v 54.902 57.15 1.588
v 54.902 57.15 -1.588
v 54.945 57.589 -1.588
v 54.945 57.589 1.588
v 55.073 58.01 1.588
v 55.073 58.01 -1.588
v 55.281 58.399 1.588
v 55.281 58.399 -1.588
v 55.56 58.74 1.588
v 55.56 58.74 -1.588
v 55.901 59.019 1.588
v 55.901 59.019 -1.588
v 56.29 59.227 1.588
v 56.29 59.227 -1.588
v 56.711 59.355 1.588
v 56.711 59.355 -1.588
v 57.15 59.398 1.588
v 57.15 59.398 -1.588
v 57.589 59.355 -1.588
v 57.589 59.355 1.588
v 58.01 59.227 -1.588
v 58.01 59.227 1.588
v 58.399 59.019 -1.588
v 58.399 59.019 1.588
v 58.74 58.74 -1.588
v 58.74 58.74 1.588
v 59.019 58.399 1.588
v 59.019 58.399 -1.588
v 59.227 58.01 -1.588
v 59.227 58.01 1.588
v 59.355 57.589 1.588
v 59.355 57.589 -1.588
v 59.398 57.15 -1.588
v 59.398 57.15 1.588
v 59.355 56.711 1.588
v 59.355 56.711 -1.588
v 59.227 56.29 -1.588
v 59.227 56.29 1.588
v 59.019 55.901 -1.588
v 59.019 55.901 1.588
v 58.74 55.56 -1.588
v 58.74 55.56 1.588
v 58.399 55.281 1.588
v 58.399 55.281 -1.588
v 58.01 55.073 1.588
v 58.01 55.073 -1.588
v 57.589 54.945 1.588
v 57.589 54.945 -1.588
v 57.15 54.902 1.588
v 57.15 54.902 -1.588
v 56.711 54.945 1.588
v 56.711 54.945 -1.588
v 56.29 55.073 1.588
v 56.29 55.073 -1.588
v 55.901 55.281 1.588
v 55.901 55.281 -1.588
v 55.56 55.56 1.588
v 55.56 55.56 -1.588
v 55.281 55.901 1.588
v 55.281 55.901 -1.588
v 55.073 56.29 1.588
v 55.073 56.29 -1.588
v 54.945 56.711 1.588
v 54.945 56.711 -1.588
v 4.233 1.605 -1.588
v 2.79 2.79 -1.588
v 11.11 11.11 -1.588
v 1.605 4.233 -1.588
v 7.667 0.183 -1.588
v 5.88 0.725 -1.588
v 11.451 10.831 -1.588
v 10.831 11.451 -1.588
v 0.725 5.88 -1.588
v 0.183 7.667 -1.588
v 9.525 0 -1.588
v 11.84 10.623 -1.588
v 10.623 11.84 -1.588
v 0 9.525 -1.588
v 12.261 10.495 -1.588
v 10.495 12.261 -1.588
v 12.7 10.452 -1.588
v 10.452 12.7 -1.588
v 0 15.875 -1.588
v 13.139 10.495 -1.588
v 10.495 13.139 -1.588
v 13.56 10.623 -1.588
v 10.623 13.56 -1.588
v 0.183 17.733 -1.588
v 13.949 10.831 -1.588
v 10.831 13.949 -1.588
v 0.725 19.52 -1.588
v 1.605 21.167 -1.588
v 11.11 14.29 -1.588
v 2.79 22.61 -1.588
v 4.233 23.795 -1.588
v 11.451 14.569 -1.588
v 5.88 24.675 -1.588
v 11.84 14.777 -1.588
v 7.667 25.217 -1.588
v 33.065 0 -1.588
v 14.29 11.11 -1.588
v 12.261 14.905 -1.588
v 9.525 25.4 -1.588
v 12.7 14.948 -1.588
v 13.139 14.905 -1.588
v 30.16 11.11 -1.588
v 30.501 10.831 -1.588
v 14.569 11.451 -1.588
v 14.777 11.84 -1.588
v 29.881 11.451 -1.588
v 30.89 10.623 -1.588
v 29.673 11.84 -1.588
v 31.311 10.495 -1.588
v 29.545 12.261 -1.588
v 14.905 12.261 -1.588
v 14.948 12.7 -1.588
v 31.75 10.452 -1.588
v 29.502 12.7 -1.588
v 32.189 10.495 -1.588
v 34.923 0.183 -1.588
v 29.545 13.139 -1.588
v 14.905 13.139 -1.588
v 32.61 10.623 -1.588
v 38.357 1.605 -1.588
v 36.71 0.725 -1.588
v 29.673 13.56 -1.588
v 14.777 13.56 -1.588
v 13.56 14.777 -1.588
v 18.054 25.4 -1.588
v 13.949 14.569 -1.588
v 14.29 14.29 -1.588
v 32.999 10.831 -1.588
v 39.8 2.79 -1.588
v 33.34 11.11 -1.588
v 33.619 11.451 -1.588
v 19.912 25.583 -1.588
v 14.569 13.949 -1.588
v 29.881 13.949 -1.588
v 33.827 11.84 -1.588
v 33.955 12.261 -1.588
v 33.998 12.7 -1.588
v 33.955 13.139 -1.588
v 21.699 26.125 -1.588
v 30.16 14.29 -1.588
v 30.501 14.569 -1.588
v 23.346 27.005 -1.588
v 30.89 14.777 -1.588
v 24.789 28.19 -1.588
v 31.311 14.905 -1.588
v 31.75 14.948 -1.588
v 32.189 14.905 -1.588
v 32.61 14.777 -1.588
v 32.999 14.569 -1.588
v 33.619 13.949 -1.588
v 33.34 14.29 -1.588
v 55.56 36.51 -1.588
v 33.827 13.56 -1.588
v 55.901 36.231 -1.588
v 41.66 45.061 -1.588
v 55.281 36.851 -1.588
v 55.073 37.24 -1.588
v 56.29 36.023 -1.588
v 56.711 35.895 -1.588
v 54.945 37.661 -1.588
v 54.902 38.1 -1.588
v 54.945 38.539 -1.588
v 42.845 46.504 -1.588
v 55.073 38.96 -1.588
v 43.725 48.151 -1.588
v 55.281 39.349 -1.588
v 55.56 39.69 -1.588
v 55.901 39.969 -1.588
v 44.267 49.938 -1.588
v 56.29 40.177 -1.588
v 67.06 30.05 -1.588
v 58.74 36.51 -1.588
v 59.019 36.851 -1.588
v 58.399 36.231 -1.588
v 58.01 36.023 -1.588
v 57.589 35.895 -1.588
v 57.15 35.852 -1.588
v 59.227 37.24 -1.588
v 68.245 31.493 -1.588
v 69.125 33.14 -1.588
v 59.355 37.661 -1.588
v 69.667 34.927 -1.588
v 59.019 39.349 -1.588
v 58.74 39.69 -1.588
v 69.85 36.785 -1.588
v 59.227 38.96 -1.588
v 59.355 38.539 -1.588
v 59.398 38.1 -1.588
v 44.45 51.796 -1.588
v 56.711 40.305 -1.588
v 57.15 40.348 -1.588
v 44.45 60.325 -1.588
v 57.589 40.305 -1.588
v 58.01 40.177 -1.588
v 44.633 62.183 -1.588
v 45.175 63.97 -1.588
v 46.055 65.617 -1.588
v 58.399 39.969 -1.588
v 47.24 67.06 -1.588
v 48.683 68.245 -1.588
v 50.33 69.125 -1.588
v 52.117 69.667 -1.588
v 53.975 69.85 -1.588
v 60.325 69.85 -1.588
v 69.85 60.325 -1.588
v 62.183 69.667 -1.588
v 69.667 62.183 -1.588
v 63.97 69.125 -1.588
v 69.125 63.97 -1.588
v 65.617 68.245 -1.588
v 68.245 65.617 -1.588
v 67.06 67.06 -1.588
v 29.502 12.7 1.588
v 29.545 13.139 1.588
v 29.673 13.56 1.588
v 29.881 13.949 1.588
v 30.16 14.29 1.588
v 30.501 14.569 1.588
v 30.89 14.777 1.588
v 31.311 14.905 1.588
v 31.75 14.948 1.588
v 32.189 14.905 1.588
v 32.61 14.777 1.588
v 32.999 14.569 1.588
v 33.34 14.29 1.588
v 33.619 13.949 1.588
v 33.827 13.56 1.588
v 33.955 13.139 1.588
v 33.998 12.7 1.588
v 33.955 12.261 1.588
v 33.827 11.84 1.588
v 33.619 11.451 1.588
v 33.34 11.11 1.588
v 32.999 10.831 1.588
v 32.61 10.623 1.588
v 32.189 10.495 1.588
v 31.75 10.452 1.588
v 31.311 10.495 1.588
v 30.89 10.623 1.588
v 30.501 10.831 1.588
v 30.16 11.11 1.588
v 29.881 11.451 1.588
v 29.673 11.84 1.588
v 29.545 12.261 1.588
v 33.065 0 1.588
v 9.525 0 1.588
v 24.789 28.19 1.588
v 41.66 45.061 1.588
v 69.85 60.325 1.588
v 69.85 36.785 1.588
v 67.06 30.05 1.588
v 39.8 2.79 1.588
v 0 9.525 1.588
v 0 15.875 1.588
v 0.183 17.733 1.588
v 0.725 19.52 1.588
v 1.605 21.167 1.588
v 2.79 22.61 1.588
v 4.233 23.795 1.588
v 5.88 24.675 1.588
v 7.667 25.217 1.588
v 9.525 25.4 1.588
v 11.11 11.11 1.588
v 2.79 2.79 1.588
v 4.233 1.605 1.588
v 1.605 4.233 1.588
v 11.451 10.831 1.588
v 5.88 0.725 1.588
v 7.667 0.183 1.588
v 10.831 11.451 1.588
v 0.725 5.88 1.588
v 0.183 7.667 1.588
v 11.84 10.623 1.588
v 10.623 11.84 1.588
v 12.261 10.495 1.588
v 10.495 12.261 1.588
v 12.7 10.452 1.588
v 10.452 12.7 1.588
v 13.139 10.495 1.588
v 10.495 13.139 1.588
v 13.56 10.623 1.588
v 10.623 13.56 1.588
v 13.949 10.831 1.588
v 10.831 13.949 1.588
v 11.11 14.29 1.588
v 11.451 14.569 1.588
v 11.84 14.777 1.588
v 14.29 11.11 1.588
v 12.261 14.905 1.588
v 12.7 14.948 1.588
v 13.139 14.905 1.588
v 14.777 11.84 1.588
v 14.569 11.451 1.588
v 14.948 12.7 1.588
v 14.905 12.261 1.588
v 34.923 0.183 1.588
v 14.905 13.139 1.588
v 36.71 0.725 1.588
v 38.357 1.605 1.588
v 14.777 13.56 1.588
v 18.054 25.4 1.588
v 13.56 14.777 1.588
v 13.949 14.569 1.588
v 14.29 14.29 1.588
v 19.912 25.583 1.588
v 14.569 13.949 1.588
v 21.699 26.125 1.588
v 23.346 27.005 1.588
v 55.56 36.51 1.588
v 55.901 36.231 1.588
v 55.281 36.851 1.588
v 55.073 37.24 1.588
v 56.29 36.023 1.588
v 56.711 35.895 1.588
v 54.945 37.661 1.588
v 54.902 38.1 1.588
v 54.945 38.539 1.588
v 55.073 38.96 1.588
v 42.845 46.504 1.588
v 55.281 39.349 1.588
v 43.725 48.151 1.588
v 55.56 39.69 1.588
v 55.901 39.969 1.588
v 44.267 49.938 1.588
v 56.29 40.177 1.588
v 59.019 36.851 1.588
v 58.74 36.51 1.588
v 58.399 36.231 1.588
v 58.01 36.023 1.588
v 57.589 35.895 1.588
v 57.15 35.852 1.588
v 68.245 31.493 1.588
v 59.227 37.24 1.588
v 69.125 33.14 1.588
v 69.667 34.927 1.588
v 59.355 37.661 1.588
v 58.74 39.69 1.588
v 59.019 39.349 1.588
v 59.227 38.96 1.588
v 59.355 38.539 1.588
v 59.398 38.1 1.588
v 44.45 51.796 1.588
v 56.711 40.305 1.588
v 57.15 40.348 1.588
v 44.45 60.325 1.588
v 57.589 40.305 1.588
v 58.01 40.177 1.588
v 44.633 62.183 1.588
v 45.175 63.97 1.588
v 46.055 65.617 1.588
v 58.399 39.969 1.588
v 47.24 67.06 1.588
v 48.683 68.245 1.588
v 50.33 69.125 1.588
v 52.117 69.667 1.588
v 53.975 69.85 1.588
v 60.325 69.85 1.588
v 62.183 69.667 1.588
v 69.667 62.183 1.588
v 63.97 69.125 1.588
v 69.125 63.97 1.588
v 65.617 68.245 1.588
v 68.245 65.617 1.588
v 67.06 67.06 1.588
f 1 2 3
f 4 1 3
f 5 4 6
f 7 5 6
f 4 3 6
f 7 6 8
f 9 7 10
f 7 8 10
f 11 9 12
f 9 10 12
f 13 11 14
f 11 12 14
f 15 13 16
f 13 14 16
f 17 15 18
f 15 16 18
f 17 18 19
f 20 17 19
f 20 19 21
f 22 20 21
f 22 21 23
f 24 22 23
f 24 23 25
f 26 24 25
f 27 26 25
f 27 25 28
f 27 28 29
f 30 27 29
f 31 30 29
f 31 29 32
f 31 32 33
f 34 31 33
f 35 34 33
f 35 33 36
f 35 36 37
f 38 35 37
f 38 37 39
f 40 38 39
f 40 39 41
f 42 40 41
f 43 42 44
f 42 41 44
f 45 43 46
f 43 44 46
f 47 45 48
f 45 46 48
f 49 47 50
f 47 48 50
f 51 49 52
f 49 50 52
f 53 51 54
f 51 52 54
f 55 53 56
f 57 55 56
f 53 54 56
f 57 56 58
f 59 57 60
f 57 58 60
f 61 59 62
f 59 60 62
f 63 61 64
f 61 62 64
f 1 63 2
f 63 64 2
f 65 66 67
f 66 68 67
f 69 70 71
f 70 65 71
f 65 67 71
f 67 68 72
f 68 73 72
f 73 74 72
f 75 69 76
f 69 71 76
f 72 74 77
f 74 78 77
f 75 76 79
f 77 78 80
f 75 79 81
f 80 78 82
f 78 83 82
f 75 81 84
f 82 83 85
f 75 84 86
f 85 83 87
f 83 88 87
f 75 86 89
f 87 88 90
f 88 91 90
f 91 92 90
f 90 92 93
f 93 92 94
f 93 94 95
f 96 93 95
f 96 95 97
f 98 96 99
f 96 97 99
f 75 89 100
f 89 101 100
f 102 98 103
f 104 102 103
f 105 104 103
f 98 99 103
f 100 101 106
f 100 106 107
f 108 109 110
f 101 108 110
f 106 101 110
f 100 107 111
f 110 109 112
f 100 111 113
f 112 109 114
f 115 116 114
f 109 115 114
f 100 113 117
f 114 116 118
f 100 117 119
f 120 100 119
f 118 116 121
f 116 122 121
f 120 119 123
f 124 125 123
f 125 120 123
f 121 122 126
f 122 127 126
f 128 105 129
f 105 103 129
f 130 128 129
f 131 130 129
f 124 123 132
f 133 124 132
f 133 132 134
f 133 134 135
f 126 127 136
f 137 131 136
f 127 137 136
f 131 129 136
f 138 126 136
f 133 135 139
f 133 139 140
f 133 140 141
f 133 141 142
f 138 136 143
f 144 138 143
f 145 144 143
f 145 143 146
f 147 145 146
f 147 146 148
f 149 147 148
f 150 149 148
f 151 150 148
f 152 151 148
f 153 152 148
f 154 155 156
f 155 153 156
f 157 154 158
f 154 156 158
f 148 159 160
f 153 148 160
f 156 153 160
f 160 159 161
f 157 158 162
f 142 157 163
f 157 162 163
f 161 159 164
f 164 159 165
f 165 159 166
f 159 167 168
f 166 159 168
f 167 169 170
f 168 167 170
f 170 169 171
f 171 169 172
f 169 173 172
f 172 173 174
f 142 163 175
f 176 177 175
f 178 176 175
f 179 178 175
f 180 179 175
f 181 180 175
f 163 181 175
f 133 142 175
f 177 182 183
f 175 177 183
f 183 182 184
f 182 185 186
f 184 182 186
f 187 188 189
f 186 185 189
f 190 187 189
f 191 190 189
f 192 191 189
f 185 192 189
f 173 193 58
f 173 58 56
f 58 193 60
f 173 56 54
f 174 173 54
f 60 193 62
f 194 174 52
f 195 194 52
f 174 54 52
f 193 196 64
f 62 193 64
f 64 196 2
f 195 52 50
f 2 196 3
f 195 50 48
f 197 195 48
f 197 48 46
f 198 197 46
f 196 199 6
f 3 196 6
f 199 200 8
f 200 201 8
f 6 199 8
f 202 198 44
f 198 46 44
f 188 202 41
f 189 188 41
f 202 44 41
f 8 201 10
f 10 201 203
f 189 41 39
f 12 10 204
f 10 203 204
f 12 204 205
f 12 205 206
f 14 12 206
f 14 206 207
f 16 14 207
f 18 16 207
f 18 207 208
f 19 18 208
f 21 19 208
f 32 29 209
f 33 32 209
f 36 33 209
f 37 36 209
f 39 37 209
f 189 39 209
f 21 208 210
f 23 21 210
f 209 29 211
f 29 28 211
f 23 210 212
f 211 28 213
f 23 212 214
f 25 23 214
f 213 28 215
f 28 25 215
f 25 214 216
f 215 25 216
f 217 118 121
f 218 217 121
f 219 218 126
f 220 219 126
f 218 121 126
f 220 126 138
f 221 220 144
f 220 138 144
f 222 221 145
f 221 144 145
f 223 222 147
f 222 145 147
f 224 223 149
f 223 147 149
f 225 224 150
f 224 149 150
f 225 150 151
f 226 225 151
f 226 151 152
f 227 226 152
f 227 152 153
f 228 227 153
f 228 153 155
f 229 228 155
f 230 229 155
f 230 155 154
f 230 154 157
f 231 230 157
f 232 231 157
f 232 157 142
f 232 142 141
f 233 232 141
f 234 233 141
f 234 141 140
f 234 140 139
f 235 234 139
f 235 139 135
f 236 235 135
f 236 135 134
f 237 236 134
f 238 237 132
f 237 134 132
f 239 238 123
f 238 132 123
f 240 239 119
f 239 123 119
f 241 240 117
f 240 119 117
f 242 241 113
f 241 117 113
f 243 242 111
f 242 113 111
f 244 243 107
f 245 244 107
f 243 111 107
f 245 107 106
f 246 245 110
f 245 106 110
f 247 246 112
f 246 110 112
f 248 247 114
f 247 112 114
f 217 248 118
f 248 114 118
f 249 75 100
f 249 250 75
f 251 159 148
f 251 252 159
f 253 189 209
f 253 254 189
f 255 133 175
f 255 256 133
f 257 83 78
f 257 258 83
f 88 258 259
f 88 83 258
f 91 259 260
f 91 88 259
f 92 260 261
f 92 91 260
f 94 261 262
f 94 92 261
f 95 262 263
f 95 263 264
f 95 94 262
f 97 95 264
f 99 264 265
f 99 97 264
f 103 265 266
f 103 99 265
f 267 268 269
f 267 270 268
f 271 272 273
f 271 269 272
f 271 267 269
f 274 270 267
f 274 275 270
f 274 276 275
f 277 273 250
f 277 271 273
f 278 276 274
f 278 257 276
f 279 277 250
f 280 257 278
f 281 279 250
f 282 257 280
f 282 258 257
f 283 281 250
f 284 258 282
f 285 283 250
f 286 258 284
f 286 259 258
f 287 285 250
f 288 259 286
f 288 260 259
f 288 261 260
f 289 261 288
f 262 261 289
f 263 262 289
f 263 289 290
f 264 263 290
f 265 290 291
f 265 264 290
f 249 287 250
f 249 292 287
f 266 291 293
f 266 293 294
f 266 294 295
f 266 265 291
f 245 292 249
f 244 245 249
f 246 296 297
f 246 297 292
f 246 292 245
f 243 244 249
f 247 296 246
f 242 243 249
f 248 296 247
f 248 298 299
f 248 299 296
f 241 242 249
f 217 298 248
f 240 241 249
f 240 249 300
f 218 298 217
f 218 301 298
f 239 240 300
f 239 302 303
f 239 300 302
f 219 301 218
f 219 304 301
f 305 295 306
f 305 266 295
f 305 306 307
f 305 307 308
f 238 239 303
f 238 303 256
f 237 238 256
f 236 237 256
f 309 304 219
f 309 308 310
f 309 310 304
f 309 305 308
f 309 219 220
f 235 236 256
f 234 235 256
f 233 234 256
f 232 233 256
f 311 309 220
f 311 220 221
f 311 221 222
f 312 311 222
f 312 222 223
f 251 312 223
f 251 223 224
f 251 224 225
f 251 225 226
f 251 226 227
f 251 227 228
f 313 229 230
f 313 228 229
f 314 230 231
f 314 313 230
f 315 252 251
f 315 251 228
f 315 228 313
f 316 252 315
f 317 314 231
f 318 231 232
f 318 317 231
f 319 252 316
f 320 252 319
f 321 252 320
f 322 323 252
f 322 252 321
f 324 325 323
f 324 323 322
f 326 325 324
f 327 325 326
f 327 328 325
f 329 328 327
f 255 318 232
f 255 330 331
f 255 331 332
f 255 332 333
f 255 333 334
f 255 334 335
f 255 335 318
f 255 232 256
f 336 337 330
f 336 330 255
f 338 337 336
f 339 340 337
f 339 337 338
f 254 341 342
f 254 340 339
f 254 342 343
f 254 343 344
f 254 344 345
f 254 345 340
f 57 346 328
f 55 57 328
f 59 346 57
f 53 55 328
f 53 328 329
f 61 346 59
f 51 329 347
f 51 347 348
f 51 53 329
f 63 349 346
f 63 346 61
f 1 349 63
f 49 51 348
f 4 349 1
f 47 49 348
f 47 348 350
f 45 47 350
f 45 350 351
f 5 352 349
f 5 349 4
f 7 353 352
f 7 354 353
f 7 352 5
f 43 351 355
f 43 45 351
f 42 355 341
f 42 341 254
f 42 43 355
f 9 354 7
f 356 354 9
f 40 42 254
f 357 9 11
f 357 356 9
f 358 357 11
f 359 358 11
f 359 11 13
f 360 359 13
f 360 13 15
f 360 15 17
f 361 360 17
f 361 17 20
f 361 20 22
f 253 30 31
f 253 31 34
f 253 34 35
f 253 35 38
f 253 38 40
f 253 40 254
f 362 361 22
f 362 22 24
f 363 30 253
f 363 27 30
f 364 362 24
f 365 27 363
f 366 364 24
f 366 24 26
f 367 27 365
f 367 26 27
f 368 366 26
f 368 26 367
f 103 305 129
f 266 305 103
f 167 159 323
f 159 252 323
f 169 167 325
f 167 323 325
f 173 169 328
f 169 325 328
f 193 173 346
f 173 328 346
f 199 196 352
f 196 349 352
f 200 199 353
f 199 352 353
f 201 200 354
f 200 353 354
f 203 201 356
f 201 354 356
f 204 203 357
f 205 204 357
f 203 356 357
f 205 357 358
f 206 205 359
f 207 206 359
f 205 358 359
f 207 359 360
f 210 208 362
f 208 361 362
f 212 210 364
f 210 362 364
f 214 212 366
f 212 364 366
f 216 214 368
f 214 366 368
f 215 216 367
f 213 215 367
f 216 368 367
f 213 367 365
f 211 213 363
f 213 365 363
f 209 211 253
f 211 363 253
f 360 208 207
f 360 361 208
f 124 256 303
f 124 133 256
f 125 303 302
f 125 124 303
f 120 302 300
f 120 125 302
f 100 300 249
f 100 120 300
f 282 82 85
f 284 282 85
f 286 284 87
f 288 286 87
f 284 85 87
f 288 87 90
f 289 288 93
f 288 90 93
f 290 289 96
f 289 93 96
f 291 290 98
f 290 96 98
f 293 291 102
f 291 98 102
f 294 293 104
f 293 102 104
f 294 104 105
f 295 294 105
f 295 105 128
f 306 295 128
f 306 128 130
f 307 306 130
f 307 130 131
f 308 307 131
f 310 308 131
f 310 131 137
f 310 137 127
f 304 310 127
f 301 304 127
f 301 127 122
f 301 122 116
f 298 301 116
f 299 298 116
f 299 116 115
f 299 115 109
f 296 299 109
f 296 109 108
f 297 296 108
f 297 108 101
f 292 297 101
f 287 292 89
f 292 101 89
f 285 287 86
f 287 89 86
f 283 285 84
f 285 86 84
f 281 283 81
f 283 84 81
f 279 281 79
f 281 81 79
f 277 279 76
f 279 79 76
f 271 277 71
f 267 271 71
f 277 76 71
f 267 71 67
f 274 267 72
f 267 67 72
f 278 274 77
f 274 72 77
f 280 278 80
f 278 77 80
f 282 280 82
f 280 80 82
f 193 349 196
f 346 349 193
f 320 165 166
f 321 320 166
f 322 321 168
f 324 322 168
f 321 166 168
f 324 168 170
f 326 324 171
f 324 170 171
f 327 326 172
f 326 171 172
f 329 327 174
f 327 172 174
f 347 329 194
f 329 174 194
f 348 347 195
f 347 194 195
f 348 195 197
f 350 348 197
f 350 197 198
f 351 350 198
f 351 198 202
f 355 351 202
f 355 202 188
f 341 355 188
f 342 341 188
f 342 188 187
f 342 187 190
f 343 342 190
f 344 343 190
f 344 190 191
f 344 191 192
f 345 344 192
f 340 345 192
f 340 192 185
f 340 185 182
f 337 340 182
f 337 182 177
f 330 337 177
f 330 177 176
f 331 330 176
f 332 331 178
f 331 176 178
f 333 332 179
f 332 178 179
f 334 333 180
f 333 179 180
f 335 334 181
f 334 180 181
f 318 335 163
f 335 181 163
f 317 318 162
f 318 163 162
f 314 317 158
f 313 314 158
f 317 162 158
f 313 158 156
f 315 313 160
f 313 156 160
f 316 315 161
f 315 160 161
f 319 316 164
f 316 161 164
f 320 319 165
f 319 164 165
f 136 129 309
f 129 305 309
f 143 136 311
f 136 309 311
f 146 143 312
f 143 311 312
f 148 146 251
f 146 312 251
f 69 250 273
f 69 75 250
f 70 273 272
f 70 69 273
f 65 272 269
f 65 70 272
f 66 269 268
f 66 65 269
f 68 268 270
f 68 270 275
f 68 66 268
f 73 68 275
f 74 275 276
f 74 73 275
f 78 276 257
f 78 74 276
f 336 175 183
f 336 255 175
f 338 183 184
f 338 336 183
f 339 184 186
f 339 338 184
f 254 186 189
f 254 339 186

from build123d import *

# Parameters (mm, degrees)
BOSS_EXTRUDE1_DEPTH   = 1.5875
FILLET1_R             = 9.525
F_8_CLEARANCE_HOLE1_D = 4.4958


with BuildPart() as part:
    # Sketch2 → Boss-Extrude1 (new, symmetric)
    with BuildSketch(Plane.XY):
        Polygon((37.010512242, 0), (69.85, 32.839487758), (69.85, 69.85), (44.45, 69.85), (44.45, 47.850640303), (21.999359697, 25.4), (0, 25.4), (0, 0), align=None)
    extrude(amount=BOSS_EXTRUDE1_DEPTH, both=True)

    # Fillet1
    fillet1_edges = [part.edges().sort_by_distance(p)[0] for p in [
        (69.85, 32.839487758, 0),
        (37.010512242, 0, 0),
        (0, 0, 0),
        (0, 25.4, 0),
        (21.999359697, 25.4, 0),
        (44.45, 47.850640303, 0),
        (44.45, 69.85, 0),
        (69.85, 69.85, 0),
    ]]
    fillet(fillet1_edges, radius=FILLET1_R)

    # #8 Clearance Hole1 (through all)
    with Locations(Plane.XY.offset(1.5875)):
        with Locations((12.7, 12.7), (31.75, 12.7), (57.15, 38.1), (57.15, 57.15)):
            Hole(F_8_CLEARANCE_HOLE1_D / 2)


solid = part.part
